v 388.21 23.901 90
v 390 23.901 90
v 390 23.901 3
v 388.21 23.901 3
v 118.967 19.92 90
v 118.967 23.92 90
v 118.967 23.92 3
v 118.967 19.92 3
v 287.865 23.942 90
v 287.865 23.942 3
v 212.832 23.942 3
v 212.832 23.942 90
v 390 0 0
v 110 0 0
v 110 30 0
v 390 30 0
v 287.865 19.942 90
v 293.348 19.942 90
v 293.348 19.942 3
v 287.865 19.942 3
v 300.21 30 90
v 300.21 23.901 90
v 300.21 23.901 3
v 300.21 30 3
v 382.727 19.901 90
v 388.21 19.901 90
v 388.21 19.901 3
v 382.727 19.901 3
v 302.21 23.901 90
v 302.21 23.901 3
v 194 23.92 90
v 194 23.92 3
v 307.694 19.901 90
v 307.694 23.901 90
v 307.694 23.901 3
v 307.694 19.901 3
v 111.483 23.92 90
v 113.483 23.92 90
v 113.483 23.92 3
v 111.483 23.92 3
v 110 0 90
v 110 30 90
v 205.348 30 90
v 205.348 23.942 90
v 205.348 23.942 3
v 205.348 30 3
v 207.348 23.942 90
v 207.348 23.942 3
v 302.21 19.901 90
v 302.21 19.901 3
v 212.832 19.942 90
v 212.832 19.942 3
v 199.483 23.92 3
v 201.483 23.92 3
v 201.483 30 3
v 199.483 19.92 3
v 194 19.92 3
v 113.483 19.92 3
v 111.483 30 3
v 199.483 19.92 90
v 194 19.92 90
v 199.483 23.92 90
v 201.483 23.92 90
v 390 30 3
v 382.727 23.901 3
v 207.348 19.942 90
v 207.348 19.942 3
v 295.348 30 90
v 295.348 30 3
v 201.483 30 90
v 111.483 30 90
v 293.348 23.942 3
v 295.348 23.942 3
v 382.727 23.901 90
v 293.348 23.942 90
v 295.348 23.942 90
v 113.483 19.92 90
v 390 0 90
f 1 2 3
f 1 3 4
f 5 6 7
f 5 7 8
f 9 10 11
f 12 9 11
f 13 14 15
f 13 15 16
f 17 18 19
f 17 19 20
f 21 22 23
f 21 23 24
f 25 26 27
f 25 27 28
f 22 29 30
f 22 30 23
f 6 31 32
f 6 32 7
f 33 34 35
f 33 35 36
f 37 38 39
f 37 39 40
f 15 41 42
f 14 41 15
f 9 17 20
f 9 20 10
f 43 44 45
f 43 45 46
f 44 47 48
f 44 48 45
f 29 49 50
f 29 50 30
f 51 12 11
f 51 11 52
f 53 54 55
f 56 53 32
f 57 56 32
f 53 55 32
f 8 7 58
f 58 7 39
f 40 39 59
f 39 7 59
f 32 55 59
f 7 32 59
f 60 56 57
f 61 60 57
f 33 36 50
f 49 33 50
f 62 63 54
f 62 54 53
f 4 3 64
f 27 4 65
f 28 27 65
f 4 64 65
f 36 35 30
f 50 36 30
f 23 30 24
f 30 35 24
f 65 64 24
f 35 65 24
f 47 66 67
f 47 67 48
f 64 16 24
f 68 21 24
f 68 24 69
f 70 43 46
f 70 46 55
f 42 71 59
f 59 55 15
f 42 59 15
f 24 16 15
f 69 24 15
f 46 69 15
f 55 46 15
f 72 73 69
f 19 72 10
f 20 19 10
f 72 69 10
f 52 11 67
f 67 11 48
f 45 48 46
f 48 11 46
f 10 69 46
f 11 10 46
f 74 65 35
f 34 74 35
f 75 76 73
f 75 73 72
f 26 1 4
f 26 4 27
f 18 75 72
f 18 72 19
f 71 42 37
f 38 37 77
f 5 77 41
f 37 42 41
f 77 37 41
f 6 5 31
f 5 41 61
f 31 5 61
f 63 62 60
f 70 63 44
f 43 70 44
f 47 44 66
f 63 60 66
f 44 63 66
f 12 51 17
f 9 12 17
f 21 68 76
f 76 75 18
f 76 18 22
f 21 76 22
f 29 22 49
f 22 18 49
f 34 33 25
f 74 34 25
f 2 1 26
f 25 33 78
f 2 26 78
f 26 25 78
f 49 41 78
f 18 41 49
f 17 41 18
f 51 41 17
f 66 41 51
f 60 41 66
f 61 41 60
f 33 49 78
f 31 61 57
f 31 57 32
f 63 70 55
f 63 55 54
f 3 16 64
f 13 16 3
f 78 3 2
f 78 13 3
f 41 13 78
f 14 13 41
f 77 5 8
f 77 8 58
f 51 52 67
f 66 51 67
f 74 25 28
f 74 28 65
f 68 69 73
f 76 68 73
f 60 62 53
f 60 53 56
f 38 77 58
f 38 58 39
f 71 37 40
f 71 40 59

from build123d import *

# Parameters (mm, degrees)
BOSS_EXTRUDE1_DEPTH = 30
CUT_EXTRUDE1_DEPTH  = 87


with BuildPart() as part:
    # Sketch1 → Boss-Extrude1 (new body)
    with BuildSketch(Plane(origin=(0, 0, 0), x_dir=(1, 0, 0), z_dir=(0, 1, 0))):
        Polygon((250, -90), (110, -90), (110, 0), (390, 0), (390, -90), align=None)
    extrude(amount=BOSS_EXTRUDE1_DEPTH)

    # Sketch3 → Cut-Extrude1 (cut)
    with BuildSketch(Plane.XY.offset(90)):
        Polygon((113.483053539, 23.920467505), (111.483053539, 23.920467505), (111.483053539, 30.115083869), (201.483053539, 30.115083869), (201.483053539, 23.920467505), (199.483053539, 23.920467505), (199.483053539, 19.920467505), (193.9996064, 19.920467505), (193.9996064, 23.920467505), (118.966500679, 23.920467505), (118.966500679, 19.920467505), (113.483053539, 19.920467505), align=None)
        Polygon((302.21010009, 23.900544193), (300.21010009, 23.900544193), (300.21010009, 30.459376692), (390.21010009, 30.459376692), (390.21010009, 23.900544193), (388.21010009, 23.900544193), (388.21010009, 19.900544193), (382.72665295, 19.900544193), (382.72665295, 23.900544193), (307.69354723, 23.900544193), (307.69354723, 19.900544193), (302.21010009, 19.900544193), align=None)
        Polygon((207.348367676, 23.942050812), (205.348367676, 23.942050812), (205.348367676, 30.00297672), (295.348367676, 30.00297672), (295.348367676, 23.942050812), (293.348367676, 23.942050812), (293.348367676, 19.942050812), (287.864920536, 19.942050812), (287.864920536, 23.942050812), (212.831814816, 23.942050812), (212.831814816, 19.942050812), (207.348367676, 19.942050812), align=None)
    extrude(amount=-CUT_EXTRUDE1_DEPTH, mode=Mode.SUBTRACT)


solid = part.part
